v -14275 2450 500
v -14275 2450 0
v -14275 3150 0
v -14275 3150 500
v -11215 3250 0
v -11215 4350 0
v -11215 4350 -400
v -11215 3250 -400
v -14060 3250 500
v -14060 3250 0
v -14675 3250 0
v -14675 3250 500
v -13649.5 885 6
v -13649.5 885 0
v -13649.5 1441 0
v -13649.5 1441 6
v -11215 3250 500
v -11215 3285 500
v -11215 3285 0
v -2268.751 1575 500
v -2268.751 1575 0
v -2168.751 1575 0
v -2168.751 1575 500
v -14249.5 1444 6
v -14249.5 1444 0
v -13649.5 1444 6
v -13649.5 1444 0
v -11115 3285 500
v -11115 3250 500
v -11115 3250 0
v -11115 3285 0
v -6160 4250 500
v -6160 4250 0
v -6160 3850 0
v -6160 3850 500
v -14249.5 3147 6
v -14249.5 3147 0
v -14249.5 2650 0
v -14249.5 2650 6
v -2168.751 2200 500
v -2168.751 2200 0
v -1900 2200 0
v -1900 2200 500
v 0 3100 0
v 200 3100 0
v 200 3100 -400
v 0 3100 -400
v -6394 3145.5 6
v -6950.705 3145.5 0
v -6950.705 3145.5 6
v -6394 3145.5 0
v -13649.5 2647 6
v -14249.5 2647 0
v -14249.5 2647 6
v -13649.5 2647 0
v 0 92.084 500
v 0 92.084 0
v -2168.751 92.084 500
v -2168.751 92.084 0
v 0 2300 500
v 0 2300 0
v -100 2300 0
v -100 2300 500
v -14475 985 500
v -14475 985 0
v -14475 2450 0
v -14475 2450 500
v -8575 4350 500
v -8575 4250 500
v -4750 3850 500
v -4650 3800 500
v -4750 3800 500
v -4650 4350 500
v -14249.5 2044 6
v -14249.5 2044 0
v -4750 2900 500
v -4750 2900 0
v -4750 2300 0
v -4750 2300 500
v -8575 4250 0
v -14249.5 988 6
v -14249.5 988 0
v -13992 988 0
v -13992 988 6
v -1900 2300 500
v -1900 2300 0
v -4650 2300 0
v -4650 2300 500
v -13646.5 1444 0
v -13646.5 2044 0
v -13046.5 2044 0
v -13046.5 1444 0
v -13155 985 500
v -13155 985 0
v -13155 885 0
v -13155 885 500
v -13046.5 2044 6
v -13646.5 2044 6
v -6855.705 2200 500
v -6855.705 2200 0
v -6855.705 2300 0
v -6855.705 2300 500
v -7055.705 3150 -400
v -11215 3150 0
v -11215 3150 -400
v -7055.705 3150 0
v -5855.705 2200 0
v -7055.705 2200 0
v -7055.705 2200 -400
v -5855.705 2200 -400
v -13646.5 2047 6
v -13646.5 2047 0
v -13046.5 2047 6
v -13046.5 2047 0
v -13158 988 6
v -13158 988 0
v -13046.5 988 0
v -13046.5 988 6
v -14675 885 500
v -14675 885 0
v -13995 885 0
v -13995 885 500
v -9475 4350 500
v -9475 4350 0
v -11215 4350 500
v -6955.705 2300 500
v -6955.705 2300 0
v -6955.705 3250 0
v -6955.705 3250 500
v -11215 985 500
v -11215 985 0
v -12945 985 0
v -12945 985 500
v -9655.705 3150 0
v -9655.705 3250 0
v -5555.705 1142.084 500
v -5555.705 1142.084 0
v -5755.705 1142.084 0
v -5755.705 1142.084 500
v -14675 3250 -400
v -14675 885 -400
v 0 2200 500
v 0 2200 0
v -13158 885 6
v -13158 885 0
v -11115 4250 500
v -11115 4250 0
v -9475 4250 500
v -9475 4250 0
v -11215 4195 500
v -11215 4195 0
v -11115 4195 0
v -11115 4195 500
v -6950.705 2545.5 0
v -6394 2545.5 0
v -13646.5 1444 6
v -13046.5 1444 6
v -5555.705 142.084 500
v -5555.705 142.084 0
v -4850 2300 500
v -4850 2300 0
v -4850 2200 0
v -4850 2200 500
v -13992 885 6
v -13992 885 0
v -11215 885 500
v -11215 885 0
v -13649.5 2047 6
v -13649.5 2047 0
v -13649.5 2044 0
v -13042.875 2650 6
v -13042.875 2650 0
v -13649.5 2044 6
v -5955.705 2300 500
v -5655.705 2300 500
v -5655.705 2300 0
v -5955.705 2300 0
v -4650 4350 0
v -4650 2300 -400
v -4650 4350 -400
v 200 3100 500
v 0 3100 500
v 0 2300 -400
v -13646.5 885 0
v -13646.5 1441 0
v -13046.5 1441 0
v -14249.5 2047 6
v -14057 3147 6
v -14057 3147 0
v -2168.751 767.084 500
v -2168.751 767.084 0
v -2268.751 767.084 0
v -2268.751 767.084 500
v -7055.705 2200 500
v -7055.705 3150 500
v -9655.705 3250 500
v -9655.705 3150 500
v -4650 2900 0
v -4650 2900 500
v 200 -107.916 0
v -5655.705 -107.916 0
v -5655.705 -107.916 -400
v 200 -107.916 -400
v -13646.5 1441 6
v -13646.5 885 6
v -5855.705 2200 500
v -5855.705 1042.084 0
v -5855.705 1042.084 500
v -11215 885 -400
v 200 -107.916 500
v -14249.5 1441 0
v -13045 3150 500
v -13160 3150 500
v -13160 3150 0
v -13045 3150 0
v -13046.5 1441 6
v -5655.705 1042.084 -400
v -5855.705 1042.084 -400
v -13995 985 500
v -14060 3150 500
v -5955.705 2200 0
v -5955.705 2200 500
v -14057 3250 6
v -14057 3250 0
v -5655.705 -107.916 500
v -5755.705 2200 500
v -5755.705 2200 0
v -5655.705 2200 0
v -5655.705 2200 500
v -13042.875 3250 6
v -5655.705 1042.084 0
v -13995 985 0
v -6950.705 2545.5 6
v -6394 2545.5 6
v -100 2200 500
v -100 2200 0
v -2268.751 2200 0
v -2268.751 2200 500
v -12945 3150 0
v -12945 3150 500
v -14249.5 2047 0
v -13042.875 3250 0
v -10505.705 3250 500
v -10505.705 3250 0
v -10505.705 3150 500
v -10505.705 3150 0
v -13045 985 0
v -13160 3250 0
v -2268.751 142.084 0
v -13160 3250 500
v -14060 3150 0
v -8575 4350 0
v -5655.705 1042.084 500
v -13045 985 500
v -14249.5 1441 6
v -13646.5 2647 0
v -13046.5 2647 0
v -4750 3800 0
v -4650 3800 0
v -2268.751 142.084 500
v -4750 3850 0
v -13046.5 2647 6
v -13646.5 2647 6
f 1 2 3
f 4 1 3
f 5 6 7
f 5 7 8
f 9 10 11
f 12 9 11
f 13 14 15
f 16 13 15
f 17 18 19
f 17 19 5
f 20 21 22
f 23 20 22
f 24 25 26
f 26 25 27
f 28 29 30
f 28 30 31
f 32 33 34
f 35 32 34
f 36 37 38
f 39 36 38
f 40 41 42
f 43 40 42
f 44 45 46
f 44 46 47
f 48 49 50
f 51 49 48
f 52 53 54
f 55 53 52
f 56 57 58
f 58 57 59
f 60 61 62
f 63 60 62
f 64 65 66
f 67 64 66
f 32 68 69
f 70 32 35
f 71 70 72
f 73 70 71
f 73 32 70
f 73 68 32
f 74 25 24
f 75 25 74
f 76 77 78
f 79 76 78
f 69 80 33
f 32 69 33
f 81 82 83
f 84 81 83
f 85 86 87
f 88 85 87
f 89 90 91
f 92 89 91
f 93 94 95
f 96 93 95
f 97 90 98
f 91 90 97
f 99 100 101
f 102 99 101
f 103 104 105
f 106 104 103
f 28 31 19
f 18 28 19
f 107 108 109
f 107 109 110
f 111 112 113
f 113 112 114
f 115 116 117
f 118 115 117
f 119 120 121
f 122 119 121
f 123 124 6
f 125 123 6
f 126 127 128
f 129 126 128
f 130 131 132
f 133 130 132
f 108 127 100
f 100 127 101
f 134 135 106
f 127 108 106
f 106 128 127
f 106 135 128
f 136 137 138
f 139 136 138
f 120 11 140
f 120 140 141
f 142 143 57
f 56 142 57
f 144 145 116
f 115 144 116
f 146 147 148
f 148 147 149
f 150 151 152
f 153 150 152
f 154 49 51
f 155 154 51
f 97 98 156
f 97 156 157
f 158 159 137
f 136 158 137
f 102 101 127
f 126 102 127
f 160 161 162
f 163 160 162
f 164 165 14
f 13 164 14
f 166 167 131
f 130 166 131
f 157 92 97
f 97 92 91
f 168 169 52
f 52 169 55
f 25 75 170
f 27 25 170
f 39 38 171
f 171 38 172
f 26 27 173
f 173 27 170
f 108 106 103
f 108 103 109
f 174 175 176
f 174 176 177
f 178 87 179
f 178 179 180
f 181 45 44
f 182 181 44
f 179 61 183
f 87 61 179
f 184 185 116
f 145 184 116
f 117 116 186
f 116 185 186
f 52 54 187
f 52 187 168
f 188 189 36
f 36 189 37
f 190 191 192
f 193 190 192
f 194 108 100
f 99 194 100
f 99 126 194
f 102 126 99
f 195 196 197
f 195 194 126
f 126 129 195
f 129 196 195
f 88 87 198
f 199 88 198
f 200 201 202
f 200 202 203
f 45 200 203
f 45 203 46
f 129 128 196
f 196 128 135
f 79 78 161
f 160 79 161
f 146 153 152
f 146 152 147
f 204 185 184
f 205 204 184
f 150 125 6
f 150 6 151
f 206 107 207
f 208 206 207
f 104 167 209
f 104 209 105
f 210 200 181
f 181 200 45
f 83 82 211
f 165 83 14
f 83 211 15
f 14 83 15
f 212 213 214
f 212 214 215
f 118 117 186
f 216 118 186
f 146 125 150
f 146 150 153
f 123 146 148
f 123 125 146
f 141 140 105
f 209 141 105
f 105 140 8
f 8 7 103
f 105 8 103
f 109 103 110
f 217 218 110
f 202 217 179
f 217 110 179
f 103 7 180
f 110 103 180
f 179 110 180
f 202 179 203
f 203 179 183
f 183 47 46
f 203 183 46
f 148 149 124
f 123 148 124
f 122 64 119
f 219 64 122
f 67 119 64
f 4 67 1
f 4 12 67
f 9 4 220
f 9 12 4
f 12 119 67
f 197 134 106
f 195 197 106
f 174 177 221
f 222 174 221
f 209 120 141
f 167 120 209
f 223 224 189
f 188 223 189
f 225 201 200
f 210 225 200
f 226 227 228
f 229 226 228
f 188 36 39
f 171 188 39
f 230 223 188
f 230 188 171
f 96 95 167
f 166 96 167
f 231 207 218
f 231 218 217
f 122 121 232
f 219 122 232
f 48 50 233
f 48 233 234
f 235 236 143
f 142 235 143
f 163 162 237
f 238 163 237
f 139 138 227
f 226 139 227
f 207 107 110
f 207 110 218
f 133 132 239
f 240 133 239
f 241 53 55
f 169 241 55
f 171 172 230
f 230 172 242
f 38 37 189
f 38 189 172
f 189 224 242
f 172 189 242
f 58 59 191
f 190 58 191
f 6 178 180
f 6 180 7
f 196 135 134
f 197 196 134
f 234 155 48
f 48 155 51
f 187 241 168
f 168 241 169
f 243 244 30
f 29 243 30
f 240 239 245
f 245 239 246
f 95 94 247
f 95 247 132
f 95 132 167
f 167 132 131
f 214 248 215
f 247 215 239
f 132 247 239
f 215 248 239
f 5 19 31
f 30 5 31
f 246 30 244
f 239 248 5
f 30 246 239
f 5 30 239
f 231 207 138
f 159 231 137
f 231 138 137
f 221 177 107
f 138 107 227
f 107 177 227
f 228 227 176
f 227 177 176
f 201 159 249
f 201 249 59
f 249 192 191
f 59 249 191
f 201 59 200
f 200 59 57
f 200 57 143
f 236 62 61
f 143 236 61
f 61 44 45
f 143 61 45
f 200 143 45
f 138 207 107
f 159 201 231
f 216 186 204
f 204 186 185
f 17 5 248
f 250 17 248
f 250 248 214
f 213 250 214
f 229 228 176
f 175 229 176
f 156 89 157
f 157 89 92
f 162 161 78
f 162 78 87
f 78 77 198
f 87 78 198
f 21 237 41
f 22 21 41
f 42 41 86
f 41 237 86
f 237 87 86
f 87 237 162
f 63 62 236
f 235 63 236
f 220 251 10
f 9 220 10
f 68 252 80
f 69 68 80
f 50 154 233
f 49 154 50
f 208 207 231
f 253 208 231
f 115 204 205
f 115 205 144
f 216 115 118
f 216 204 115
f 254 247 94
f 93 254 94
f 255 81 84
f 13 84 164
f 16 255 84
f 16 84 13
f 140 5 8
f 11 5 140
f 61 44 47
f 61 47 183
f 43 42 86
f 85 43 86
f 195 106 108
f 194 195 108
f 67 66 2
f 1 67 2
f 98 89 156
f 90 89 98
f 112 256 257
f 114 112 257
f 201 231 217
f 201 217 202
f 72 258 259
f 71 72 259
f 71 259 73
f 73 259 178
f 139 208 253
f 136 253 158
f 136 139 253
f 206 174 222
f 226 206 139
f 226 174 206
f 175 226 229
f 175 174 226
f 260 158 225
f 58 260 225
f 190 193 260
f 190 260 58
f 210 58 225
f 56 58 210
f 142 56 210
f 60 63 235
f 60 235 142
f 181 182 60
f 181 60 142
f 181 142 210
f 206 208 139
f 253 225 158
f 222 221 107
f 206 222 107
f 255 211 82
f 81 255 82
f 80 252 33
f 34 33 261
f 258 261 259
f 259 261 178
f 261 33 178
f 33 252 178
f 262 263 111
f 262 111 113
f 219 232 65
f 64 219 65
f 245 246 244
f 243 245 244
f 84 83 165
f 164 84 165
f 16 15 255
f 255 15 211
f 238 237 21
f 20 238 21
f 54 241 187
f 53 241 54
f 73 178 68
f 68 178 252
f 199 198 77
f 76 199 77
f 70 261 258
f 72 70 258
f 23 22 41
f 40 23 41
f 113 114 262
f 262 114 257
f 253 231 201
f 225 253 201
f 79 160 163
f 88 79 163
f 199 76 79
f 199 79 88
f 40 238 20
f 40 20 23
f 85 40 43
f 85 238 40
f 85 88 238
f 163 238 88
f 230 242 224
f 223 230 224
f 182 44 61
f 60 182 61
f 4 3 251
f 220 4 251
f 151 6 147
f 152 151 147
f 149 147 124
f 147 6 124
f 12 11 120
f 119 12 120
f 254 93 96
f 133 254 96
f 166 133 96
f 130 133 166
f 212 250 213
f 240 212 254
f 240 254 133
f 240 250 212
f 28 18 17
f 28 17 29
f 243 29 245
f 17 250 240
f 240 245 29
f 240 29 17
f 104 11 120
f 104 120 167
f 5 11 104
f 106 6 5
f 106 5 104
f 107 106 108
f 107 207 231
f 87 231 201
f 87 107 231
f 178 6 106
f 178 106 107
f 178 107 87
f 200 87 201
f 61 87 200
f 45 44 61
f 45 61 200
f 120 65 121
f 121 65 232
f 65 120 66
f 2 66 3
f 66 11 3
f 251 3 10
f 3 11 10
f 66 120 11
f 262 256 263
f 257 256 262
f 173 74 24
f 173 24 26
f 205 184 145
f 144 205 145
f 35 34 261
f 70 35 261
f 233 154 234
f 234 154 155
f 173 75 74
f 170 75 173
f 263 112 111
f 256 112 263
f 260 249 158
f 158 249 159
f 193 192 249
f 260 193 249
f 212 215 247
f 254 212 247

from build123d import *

# Parameters (mm, degrees)
F0_W     = 1730
F0_H     = 2165
F1_DEPTH = 400
F2_DEPTH = 500
F3_W     = 600
F3_H     = 600
F4_DEPTH = 6
F3_W_2   = 120.124710083
F3_H_2   = 103
F3_W_3   = 556.7045936584
F5_DEPTH = 6


with BuildPart() as f1:
    # F0 (on Top) → F1 (new body)
    with BuildSketch(Plane.XY):
        Polygon((0, 142.0842932612), (0, 2200), (-100, 2200), (-100, 2300), (-1900, 2300), (-1900, 2200), (-2168.751001358, 2200), (-2168.751001358, 1575), (-2268.751001358, 1575), (-2268.751001358, 2200), (-4650, 2200), (-4750, 2200), (-4850, 2200), (-4850, 2300), (-4750, 2300), (-4750, 2900), (-4650, 2900), (-4650, 3250), (-4650, 3800), (-4750, 3800), (-4750, 3850), (-6160, 3850), (-6160, 4250), (-8575, 4250), (-8575, 4350), (-9475, 4350), (-9475, 4250), (-11115, 4250), (-11115, 4195), (-11215, 4195), (-11215, 3285), (-11115, 3285), (-11115, 3250), (-10505.7045936584, 3250), (-10505.7045936584, 3150), (-9655.7045936584, 3150), (-9655.7045936584, 3250), (-7055.7045936584, 3250), (-6955.7045936584, 3250), (-6955.7045936584, 3150), (-6955.7045936584, 2300), (-6855.7045936584, 2300), (-6855.7045936584, 2200), (-5955.7045936584, 2200), (-5955.7045936584, 2300), (-5655.7045936584, 2300), (-5655.7045936584, 2200), (-5755.7045936584, 2200), (-5755.7045936584, 1142.0842932612), (-5555.7045936584, 1142.0842932612), (-5555.7045936584, 142.0842932612), (-2268.751001358, 142.0842932612), (-2268.751001358, 767.0842932612), (-2168.751001358, 767.0842932612), (-2168.751001358, 142.0842932612), (-2168.751001358, 92.0842932612), (0, 92.0842932612), align=None)
        Polygon((-100, 2200), (0, 2200), (0, 142.0842932612), (200, 142.0842932612), (200, 3100), (0, 3100), (0, 2300), (-100, 2300), align=None)
        Polygon((200, 142.0842932612), (0, 142.0842932612), (0, 92.0842932612), (-2168.751001358, 92.0842932612), (-2168.751001358, 142.0842932612), (-2168.751001358, 767.0842932612), (-2268.751001358, 767.0842932612), (-2268.751001358, 142.0842932612), (-5555.7045936584, 142.0842932612), (-5555.7045936584, 1142.0842932612), (-5755.7045936584, 1142.0842932612), (-5755.7045936584, 2200), (-5655.7045936584, 2200), (-5655.7045936584, 2300), (-5955.7045936584, 2300), (-5955.7045936584, 2200), (-5855.7045936584, 2200), (-5855.7045936584, 1042.0842932612), (-5655.7045936584, 1042.0842932612), (-5655.7045936584, -107.9157067388), (200, -107.9157067388), (200, 0), align=None)
        Polygon((-1900, 2200), (-1900, 2300), (-4650, 2300), (-4650, 2900), (-4750, 2900), (-4750, 2300), (-4850, 2300), (-4850, 2200), (-4750, 2200), (-4650, 2200), (-2268.751001358, 2200), (-2268.751001358, 1575), (-2168.751001358, 1575), (-2168.751001358, 2200), align=None)
        Polygon((-4750, 3800), (-4650, 3800), (-4650, 4250), (-4650, 4350), (-4750, 4350), (-8575, 4350), (-8575, 4250), (-6160, 4250), (-6160, 3850), (-4750, 3850), align=None)
        Polygon((-7055.7045936584, 2200), (-6855.7045936584, 2200), (-6855.7045936584, 2300), (-6955.7045936584, 2300), (-6955.7045936584, 3150), (-6955.7045936584, 3250), (-7055.7045936584, 3250), (-9655.7045936584, 3250), (-9655.7045936584, 3150), (-7055.7045936584, 3150), align=None)
        Polygon((-9475, 4250), (-9475, 4350), (-11115, 4350), (-11215, 4350), (-11215, 4195), (-11115, 4195), (-11115, 4250), align=None)
        Polygon((-11215, 3150), (-10505.7045936584, 3150), (-10505.7045936584, 3250), (-11115, 3250), (-11115, 3285), (-11215, 3285), (-11215, 3250), align=None)
        Polygon((-12945, 3150), (-11215, 3150), (-11215, 3250), (-12945, 3250), (-13160, 3250), (-13160, 3150), (-13045, 3150), (-13045, 985), (-12945, 985), align=None)
        with Locations((-12080, 2067.5)):
            Rectangle(F0_W, F0_H)
        Polygon((-11215, 885), (-11215, 985), (-12945, 985), (-13045, 985), (-13155, 985), (-13155, 885), align=None)
        Polygon((-13995, 885), (-13155, 885), (-13155, 985), (-13045, 985), (-13045, 3150), (-13160, 3150), (-13160, 3250), (-14060, 3250), (-14060, 3150), (-14275, 3150), (-14275, 2450), (-14475, 2450), (-14475, 985), (-13995, 985), align=None)
        Polygon((-14475, 885), (-13995, 885), (-13995, 985), (-14475, 985), (-14475, 2450), (-14275, 2450), (-14275, 3150), (-14060, 3150), (-14060, 3250), (-14675, 3250), (-14675, 985), (-14675, 885), align=None)
    extrude(amount=-F1_DEPTH)


with BuildPart() as f2:
    # F0 (on Top) → F2 (new body)
    with BuildSketch(Plane.XY):
        Polygon((-9475, 4250), (-9475, 4350), (-11115, 4350), (-11215, 4350), (-11215, 4195), (-11115, 4195), (-11115, 4250), align=None)
    extrude(amount=F2_DEPTH)


with BuildPart() as f2b:
    # F0 (on Top) → F2, piece 2 (new body)
    with BuildSketch(Plane.XY):
        Polygon((-4750, 3800), (-4650, 3800), (-4650, 4250), (-4650, 4350), (-4750, 4350), (-8575, 4350), (-8575, 4250), (-6160, 4250), (-6160, 3850), (-4750, 3850), align=None)
    extrude(amount=F2_DEPTH)


with BuildPart() as f2c:
    # F0 (on Top) → F2, piece 3 (new body)
    with BuildSketch(Plane.XY):
        Polygon((-11215, 3150), (-10505.7045936584, 3150), (-10505.7045936584, 3250), (-11115, 3250), (-11115, 3285), (-11215, 3285), (-11215, 3250), align=None)
        Polygon((-12945, 3150), (-11215, 3150), (-11215, 3250), (-12945, 3250), (-13160, 3250), (-13160, 3150), (-13045, 3150), (-13045, 985), (-12945, 985), align=None)
        Polygon((-11215, 885), (-11215, 985), (-12945, 985), (-13045, 985), (-13155, 985), (-13155, 885), align=None)
    extrude(amount=F2_DEPTH)


with BuildPart() as f2d:
    # F0 (on Top) → F2, piece 4 (new body)
    with BuildSketch(Plane.XY):
        Polygon((-14475, 885), (-13995, 885), (-13995, 985), (-14475, 985), (-14475, 2450), (-14275, 2450), (-14275, 3150), (-14060, 3150), (-14060, 3250), (-14675, 3250), (-14675, 985), (-14675, 885), align=None)
    extrude(amount=F2_DEPTH)


with BuildPart() as f2e:
    # F0 (on Top) → F2, piece 5 (new body)
    with BuildSketch(Plane.XY):
        Polygon((200, 142.0842932612), (0, 142.0842932612), (0, 92.0842932612), (-2168.751001358, 92.0842932612), (-2168.751001358, 142.0842932612), (-2168.751001358, 767.0842932612), (-2268.751001358, 767.0842932612), (-2268.751001358, 142.0842932612), (-5555.7045936584, 142.0842932612), (-5555.7045936584, 1142.0842932612), (-5755.7045936584, 1142.0842932612), (-5755.7045936584, 2200), (-5655.7045936584, 2200), (-5655.7045936584, 2300), (-5955.7045936584, 2300), (-5955.7045936584, 2200), (-5855.7045936584, 2200), (-5855.7045936584, 1042.0842932612), (-5655.7045936584, 1042.0842932612), (-5655.7045936584, -107.9157067388), (200, -107.9157067388), (200, 0), align=None)
        Polygon((-100, 2200), (0, 2200), (0, 142.0842932612), (200, 142.0842932612), (200, 3100), (0, 3100), (0, 2300), (-100, 2300), align=None)
    extrude(amount=F2_DEPTH)


with BuildPart() as f2f:
    # F0 (on Top) → F2, piece 6 (new body)
    with BuildSketch(Plane.XY):
        Polygon((-1900, 2200), (-1900, 2300), (-4650, 2300), (-4650, 2900), (-4750, 2900), (-4750, 2300), (-4850, 2300), (-4850, 2200), (-4750, 2200), (-4650, 2200), (-2268.751001358, 2200), (-2268.751001358, 1575), (-2168.751001358, 1575), (-2168.751001358, 2200), align=None)
    extrude(amount=F2_DEPTH)


with BuildPart() as f2g:
    # F0 (on Top) → F2, piece 7 (new body)
    with BuildSketch(Plane.XY):
        Polygon((-7055.7045936584, 2200), (-6855.7045936584, 2200), (-6855.7045936584, 2300), (-6955.7045936584, 2300), (-6955.7045936584, 3150), (-6955.7045936584, 3250), (-7055.7045936584, 3250), (-9655.7045936584, 3250), (-9655.7045936584, 3150), (-7055.7045936584, 3150), align=None)
    extrude(amount=F2_DEPTH)


with BuildPart() as f4:
    # F3 (on face) → F4 (new body)
    with BuildSketch(Plane.XY):
        with Locations((-13346.5, 2347)):
            Rectangle(F3_W, F3_H)
    extrude(amount=F4_DEPTH)


with BuildPart() as f4b:
    # F3 (on face) → F4, piece 2 (new body)
    with BuildSketch(Plane.XY):
        with Locations((-13949.5, 2347)):
            Rectangle(F3_W, F3_H)
    extrude(amount=F4_DEPTH)


with BuildPart() as f4c:
    # F3 (on face) → F4, piece 3 (new body)
    with BuildSketch(Plane.XY):
        Polygon((-13163, 3250), (-13646.5, 3250), (-13646.5, 2650), (-13042.875289917, 2650), (-13042.875289917, 3147), (-13163, 3147), align=None)
        Polygon((-13646.5, 2650), (-13646.5, 3250), (-14057, 3250), (-14057, 3147), (-14249.5, 3147), (-14249.5, 2650), align=None)
        with Locations((-13102.9376449585, 3198.5)):
            Rectangle(F3_W_2, F3_H_2)
    extrude(amount=F4_DEPTH)


with BuildPart() as f4d:
    # F3 (on face) → F4, piece 4 (new body)
    with BuildSketch(Plane.XY):
        Polygon((-13992, 988), (-13992, 885), (-13649.5, 885), (-13649.5, 1441), (-14249.5, 1441), (-14249.5, 988), align=None)
    extrude(amount=F4_DEPTH)


with BuildPart() as f4e:
    # F3 (on face) → F4, piece 5 (new body)
    with BuildSketch(Plane.XY):
        with Locations((-13949.5, 1744)):
            Rectangle(F3_W, F3_H)
    extrude(amount=F4_DEPTH)


with BuildPart() as f4f:
    # F3 (on face) → F4, piece 6 (new body)
    with BuildSketch(Plane.XY):
        with Locations((-13346.5, 1744)):
            Rectangle(F3_W, F3_H)
    extrude(amount=F4_DEPTH)


with BuildPart() as f4g:
    # F3 (on face) → F4, piece 7 (new body)
    with BuildSketch(Plane.XY):
        with Locations((-6672.3522968292, 2845.5)):
            Rectangle(F3_W_3, F3_H)
    extrude(amount=F4_DEPTH)


with BuildPart() as f5:
    # F3 (on face) → F5 (new body)
    with BuildSketch(Plane.XY):
        Polygon((-13646.5, 1441), (-13646.5, 885), (-13158, 885), (-13158, 988), (-13046.5, 988), (-13046.5, 1441), align=None)
    extrude(amount=F5_DEPTH)


solid = Compound([f1.part, f2.part, f2b.part, f2c.part, f2d.part, f2e.part, f2f.part, f2g.part, f4.part, f4b.part, f4c.part, f4d.part, f4e.part, f4f.part, f4g.part, f5.part])
